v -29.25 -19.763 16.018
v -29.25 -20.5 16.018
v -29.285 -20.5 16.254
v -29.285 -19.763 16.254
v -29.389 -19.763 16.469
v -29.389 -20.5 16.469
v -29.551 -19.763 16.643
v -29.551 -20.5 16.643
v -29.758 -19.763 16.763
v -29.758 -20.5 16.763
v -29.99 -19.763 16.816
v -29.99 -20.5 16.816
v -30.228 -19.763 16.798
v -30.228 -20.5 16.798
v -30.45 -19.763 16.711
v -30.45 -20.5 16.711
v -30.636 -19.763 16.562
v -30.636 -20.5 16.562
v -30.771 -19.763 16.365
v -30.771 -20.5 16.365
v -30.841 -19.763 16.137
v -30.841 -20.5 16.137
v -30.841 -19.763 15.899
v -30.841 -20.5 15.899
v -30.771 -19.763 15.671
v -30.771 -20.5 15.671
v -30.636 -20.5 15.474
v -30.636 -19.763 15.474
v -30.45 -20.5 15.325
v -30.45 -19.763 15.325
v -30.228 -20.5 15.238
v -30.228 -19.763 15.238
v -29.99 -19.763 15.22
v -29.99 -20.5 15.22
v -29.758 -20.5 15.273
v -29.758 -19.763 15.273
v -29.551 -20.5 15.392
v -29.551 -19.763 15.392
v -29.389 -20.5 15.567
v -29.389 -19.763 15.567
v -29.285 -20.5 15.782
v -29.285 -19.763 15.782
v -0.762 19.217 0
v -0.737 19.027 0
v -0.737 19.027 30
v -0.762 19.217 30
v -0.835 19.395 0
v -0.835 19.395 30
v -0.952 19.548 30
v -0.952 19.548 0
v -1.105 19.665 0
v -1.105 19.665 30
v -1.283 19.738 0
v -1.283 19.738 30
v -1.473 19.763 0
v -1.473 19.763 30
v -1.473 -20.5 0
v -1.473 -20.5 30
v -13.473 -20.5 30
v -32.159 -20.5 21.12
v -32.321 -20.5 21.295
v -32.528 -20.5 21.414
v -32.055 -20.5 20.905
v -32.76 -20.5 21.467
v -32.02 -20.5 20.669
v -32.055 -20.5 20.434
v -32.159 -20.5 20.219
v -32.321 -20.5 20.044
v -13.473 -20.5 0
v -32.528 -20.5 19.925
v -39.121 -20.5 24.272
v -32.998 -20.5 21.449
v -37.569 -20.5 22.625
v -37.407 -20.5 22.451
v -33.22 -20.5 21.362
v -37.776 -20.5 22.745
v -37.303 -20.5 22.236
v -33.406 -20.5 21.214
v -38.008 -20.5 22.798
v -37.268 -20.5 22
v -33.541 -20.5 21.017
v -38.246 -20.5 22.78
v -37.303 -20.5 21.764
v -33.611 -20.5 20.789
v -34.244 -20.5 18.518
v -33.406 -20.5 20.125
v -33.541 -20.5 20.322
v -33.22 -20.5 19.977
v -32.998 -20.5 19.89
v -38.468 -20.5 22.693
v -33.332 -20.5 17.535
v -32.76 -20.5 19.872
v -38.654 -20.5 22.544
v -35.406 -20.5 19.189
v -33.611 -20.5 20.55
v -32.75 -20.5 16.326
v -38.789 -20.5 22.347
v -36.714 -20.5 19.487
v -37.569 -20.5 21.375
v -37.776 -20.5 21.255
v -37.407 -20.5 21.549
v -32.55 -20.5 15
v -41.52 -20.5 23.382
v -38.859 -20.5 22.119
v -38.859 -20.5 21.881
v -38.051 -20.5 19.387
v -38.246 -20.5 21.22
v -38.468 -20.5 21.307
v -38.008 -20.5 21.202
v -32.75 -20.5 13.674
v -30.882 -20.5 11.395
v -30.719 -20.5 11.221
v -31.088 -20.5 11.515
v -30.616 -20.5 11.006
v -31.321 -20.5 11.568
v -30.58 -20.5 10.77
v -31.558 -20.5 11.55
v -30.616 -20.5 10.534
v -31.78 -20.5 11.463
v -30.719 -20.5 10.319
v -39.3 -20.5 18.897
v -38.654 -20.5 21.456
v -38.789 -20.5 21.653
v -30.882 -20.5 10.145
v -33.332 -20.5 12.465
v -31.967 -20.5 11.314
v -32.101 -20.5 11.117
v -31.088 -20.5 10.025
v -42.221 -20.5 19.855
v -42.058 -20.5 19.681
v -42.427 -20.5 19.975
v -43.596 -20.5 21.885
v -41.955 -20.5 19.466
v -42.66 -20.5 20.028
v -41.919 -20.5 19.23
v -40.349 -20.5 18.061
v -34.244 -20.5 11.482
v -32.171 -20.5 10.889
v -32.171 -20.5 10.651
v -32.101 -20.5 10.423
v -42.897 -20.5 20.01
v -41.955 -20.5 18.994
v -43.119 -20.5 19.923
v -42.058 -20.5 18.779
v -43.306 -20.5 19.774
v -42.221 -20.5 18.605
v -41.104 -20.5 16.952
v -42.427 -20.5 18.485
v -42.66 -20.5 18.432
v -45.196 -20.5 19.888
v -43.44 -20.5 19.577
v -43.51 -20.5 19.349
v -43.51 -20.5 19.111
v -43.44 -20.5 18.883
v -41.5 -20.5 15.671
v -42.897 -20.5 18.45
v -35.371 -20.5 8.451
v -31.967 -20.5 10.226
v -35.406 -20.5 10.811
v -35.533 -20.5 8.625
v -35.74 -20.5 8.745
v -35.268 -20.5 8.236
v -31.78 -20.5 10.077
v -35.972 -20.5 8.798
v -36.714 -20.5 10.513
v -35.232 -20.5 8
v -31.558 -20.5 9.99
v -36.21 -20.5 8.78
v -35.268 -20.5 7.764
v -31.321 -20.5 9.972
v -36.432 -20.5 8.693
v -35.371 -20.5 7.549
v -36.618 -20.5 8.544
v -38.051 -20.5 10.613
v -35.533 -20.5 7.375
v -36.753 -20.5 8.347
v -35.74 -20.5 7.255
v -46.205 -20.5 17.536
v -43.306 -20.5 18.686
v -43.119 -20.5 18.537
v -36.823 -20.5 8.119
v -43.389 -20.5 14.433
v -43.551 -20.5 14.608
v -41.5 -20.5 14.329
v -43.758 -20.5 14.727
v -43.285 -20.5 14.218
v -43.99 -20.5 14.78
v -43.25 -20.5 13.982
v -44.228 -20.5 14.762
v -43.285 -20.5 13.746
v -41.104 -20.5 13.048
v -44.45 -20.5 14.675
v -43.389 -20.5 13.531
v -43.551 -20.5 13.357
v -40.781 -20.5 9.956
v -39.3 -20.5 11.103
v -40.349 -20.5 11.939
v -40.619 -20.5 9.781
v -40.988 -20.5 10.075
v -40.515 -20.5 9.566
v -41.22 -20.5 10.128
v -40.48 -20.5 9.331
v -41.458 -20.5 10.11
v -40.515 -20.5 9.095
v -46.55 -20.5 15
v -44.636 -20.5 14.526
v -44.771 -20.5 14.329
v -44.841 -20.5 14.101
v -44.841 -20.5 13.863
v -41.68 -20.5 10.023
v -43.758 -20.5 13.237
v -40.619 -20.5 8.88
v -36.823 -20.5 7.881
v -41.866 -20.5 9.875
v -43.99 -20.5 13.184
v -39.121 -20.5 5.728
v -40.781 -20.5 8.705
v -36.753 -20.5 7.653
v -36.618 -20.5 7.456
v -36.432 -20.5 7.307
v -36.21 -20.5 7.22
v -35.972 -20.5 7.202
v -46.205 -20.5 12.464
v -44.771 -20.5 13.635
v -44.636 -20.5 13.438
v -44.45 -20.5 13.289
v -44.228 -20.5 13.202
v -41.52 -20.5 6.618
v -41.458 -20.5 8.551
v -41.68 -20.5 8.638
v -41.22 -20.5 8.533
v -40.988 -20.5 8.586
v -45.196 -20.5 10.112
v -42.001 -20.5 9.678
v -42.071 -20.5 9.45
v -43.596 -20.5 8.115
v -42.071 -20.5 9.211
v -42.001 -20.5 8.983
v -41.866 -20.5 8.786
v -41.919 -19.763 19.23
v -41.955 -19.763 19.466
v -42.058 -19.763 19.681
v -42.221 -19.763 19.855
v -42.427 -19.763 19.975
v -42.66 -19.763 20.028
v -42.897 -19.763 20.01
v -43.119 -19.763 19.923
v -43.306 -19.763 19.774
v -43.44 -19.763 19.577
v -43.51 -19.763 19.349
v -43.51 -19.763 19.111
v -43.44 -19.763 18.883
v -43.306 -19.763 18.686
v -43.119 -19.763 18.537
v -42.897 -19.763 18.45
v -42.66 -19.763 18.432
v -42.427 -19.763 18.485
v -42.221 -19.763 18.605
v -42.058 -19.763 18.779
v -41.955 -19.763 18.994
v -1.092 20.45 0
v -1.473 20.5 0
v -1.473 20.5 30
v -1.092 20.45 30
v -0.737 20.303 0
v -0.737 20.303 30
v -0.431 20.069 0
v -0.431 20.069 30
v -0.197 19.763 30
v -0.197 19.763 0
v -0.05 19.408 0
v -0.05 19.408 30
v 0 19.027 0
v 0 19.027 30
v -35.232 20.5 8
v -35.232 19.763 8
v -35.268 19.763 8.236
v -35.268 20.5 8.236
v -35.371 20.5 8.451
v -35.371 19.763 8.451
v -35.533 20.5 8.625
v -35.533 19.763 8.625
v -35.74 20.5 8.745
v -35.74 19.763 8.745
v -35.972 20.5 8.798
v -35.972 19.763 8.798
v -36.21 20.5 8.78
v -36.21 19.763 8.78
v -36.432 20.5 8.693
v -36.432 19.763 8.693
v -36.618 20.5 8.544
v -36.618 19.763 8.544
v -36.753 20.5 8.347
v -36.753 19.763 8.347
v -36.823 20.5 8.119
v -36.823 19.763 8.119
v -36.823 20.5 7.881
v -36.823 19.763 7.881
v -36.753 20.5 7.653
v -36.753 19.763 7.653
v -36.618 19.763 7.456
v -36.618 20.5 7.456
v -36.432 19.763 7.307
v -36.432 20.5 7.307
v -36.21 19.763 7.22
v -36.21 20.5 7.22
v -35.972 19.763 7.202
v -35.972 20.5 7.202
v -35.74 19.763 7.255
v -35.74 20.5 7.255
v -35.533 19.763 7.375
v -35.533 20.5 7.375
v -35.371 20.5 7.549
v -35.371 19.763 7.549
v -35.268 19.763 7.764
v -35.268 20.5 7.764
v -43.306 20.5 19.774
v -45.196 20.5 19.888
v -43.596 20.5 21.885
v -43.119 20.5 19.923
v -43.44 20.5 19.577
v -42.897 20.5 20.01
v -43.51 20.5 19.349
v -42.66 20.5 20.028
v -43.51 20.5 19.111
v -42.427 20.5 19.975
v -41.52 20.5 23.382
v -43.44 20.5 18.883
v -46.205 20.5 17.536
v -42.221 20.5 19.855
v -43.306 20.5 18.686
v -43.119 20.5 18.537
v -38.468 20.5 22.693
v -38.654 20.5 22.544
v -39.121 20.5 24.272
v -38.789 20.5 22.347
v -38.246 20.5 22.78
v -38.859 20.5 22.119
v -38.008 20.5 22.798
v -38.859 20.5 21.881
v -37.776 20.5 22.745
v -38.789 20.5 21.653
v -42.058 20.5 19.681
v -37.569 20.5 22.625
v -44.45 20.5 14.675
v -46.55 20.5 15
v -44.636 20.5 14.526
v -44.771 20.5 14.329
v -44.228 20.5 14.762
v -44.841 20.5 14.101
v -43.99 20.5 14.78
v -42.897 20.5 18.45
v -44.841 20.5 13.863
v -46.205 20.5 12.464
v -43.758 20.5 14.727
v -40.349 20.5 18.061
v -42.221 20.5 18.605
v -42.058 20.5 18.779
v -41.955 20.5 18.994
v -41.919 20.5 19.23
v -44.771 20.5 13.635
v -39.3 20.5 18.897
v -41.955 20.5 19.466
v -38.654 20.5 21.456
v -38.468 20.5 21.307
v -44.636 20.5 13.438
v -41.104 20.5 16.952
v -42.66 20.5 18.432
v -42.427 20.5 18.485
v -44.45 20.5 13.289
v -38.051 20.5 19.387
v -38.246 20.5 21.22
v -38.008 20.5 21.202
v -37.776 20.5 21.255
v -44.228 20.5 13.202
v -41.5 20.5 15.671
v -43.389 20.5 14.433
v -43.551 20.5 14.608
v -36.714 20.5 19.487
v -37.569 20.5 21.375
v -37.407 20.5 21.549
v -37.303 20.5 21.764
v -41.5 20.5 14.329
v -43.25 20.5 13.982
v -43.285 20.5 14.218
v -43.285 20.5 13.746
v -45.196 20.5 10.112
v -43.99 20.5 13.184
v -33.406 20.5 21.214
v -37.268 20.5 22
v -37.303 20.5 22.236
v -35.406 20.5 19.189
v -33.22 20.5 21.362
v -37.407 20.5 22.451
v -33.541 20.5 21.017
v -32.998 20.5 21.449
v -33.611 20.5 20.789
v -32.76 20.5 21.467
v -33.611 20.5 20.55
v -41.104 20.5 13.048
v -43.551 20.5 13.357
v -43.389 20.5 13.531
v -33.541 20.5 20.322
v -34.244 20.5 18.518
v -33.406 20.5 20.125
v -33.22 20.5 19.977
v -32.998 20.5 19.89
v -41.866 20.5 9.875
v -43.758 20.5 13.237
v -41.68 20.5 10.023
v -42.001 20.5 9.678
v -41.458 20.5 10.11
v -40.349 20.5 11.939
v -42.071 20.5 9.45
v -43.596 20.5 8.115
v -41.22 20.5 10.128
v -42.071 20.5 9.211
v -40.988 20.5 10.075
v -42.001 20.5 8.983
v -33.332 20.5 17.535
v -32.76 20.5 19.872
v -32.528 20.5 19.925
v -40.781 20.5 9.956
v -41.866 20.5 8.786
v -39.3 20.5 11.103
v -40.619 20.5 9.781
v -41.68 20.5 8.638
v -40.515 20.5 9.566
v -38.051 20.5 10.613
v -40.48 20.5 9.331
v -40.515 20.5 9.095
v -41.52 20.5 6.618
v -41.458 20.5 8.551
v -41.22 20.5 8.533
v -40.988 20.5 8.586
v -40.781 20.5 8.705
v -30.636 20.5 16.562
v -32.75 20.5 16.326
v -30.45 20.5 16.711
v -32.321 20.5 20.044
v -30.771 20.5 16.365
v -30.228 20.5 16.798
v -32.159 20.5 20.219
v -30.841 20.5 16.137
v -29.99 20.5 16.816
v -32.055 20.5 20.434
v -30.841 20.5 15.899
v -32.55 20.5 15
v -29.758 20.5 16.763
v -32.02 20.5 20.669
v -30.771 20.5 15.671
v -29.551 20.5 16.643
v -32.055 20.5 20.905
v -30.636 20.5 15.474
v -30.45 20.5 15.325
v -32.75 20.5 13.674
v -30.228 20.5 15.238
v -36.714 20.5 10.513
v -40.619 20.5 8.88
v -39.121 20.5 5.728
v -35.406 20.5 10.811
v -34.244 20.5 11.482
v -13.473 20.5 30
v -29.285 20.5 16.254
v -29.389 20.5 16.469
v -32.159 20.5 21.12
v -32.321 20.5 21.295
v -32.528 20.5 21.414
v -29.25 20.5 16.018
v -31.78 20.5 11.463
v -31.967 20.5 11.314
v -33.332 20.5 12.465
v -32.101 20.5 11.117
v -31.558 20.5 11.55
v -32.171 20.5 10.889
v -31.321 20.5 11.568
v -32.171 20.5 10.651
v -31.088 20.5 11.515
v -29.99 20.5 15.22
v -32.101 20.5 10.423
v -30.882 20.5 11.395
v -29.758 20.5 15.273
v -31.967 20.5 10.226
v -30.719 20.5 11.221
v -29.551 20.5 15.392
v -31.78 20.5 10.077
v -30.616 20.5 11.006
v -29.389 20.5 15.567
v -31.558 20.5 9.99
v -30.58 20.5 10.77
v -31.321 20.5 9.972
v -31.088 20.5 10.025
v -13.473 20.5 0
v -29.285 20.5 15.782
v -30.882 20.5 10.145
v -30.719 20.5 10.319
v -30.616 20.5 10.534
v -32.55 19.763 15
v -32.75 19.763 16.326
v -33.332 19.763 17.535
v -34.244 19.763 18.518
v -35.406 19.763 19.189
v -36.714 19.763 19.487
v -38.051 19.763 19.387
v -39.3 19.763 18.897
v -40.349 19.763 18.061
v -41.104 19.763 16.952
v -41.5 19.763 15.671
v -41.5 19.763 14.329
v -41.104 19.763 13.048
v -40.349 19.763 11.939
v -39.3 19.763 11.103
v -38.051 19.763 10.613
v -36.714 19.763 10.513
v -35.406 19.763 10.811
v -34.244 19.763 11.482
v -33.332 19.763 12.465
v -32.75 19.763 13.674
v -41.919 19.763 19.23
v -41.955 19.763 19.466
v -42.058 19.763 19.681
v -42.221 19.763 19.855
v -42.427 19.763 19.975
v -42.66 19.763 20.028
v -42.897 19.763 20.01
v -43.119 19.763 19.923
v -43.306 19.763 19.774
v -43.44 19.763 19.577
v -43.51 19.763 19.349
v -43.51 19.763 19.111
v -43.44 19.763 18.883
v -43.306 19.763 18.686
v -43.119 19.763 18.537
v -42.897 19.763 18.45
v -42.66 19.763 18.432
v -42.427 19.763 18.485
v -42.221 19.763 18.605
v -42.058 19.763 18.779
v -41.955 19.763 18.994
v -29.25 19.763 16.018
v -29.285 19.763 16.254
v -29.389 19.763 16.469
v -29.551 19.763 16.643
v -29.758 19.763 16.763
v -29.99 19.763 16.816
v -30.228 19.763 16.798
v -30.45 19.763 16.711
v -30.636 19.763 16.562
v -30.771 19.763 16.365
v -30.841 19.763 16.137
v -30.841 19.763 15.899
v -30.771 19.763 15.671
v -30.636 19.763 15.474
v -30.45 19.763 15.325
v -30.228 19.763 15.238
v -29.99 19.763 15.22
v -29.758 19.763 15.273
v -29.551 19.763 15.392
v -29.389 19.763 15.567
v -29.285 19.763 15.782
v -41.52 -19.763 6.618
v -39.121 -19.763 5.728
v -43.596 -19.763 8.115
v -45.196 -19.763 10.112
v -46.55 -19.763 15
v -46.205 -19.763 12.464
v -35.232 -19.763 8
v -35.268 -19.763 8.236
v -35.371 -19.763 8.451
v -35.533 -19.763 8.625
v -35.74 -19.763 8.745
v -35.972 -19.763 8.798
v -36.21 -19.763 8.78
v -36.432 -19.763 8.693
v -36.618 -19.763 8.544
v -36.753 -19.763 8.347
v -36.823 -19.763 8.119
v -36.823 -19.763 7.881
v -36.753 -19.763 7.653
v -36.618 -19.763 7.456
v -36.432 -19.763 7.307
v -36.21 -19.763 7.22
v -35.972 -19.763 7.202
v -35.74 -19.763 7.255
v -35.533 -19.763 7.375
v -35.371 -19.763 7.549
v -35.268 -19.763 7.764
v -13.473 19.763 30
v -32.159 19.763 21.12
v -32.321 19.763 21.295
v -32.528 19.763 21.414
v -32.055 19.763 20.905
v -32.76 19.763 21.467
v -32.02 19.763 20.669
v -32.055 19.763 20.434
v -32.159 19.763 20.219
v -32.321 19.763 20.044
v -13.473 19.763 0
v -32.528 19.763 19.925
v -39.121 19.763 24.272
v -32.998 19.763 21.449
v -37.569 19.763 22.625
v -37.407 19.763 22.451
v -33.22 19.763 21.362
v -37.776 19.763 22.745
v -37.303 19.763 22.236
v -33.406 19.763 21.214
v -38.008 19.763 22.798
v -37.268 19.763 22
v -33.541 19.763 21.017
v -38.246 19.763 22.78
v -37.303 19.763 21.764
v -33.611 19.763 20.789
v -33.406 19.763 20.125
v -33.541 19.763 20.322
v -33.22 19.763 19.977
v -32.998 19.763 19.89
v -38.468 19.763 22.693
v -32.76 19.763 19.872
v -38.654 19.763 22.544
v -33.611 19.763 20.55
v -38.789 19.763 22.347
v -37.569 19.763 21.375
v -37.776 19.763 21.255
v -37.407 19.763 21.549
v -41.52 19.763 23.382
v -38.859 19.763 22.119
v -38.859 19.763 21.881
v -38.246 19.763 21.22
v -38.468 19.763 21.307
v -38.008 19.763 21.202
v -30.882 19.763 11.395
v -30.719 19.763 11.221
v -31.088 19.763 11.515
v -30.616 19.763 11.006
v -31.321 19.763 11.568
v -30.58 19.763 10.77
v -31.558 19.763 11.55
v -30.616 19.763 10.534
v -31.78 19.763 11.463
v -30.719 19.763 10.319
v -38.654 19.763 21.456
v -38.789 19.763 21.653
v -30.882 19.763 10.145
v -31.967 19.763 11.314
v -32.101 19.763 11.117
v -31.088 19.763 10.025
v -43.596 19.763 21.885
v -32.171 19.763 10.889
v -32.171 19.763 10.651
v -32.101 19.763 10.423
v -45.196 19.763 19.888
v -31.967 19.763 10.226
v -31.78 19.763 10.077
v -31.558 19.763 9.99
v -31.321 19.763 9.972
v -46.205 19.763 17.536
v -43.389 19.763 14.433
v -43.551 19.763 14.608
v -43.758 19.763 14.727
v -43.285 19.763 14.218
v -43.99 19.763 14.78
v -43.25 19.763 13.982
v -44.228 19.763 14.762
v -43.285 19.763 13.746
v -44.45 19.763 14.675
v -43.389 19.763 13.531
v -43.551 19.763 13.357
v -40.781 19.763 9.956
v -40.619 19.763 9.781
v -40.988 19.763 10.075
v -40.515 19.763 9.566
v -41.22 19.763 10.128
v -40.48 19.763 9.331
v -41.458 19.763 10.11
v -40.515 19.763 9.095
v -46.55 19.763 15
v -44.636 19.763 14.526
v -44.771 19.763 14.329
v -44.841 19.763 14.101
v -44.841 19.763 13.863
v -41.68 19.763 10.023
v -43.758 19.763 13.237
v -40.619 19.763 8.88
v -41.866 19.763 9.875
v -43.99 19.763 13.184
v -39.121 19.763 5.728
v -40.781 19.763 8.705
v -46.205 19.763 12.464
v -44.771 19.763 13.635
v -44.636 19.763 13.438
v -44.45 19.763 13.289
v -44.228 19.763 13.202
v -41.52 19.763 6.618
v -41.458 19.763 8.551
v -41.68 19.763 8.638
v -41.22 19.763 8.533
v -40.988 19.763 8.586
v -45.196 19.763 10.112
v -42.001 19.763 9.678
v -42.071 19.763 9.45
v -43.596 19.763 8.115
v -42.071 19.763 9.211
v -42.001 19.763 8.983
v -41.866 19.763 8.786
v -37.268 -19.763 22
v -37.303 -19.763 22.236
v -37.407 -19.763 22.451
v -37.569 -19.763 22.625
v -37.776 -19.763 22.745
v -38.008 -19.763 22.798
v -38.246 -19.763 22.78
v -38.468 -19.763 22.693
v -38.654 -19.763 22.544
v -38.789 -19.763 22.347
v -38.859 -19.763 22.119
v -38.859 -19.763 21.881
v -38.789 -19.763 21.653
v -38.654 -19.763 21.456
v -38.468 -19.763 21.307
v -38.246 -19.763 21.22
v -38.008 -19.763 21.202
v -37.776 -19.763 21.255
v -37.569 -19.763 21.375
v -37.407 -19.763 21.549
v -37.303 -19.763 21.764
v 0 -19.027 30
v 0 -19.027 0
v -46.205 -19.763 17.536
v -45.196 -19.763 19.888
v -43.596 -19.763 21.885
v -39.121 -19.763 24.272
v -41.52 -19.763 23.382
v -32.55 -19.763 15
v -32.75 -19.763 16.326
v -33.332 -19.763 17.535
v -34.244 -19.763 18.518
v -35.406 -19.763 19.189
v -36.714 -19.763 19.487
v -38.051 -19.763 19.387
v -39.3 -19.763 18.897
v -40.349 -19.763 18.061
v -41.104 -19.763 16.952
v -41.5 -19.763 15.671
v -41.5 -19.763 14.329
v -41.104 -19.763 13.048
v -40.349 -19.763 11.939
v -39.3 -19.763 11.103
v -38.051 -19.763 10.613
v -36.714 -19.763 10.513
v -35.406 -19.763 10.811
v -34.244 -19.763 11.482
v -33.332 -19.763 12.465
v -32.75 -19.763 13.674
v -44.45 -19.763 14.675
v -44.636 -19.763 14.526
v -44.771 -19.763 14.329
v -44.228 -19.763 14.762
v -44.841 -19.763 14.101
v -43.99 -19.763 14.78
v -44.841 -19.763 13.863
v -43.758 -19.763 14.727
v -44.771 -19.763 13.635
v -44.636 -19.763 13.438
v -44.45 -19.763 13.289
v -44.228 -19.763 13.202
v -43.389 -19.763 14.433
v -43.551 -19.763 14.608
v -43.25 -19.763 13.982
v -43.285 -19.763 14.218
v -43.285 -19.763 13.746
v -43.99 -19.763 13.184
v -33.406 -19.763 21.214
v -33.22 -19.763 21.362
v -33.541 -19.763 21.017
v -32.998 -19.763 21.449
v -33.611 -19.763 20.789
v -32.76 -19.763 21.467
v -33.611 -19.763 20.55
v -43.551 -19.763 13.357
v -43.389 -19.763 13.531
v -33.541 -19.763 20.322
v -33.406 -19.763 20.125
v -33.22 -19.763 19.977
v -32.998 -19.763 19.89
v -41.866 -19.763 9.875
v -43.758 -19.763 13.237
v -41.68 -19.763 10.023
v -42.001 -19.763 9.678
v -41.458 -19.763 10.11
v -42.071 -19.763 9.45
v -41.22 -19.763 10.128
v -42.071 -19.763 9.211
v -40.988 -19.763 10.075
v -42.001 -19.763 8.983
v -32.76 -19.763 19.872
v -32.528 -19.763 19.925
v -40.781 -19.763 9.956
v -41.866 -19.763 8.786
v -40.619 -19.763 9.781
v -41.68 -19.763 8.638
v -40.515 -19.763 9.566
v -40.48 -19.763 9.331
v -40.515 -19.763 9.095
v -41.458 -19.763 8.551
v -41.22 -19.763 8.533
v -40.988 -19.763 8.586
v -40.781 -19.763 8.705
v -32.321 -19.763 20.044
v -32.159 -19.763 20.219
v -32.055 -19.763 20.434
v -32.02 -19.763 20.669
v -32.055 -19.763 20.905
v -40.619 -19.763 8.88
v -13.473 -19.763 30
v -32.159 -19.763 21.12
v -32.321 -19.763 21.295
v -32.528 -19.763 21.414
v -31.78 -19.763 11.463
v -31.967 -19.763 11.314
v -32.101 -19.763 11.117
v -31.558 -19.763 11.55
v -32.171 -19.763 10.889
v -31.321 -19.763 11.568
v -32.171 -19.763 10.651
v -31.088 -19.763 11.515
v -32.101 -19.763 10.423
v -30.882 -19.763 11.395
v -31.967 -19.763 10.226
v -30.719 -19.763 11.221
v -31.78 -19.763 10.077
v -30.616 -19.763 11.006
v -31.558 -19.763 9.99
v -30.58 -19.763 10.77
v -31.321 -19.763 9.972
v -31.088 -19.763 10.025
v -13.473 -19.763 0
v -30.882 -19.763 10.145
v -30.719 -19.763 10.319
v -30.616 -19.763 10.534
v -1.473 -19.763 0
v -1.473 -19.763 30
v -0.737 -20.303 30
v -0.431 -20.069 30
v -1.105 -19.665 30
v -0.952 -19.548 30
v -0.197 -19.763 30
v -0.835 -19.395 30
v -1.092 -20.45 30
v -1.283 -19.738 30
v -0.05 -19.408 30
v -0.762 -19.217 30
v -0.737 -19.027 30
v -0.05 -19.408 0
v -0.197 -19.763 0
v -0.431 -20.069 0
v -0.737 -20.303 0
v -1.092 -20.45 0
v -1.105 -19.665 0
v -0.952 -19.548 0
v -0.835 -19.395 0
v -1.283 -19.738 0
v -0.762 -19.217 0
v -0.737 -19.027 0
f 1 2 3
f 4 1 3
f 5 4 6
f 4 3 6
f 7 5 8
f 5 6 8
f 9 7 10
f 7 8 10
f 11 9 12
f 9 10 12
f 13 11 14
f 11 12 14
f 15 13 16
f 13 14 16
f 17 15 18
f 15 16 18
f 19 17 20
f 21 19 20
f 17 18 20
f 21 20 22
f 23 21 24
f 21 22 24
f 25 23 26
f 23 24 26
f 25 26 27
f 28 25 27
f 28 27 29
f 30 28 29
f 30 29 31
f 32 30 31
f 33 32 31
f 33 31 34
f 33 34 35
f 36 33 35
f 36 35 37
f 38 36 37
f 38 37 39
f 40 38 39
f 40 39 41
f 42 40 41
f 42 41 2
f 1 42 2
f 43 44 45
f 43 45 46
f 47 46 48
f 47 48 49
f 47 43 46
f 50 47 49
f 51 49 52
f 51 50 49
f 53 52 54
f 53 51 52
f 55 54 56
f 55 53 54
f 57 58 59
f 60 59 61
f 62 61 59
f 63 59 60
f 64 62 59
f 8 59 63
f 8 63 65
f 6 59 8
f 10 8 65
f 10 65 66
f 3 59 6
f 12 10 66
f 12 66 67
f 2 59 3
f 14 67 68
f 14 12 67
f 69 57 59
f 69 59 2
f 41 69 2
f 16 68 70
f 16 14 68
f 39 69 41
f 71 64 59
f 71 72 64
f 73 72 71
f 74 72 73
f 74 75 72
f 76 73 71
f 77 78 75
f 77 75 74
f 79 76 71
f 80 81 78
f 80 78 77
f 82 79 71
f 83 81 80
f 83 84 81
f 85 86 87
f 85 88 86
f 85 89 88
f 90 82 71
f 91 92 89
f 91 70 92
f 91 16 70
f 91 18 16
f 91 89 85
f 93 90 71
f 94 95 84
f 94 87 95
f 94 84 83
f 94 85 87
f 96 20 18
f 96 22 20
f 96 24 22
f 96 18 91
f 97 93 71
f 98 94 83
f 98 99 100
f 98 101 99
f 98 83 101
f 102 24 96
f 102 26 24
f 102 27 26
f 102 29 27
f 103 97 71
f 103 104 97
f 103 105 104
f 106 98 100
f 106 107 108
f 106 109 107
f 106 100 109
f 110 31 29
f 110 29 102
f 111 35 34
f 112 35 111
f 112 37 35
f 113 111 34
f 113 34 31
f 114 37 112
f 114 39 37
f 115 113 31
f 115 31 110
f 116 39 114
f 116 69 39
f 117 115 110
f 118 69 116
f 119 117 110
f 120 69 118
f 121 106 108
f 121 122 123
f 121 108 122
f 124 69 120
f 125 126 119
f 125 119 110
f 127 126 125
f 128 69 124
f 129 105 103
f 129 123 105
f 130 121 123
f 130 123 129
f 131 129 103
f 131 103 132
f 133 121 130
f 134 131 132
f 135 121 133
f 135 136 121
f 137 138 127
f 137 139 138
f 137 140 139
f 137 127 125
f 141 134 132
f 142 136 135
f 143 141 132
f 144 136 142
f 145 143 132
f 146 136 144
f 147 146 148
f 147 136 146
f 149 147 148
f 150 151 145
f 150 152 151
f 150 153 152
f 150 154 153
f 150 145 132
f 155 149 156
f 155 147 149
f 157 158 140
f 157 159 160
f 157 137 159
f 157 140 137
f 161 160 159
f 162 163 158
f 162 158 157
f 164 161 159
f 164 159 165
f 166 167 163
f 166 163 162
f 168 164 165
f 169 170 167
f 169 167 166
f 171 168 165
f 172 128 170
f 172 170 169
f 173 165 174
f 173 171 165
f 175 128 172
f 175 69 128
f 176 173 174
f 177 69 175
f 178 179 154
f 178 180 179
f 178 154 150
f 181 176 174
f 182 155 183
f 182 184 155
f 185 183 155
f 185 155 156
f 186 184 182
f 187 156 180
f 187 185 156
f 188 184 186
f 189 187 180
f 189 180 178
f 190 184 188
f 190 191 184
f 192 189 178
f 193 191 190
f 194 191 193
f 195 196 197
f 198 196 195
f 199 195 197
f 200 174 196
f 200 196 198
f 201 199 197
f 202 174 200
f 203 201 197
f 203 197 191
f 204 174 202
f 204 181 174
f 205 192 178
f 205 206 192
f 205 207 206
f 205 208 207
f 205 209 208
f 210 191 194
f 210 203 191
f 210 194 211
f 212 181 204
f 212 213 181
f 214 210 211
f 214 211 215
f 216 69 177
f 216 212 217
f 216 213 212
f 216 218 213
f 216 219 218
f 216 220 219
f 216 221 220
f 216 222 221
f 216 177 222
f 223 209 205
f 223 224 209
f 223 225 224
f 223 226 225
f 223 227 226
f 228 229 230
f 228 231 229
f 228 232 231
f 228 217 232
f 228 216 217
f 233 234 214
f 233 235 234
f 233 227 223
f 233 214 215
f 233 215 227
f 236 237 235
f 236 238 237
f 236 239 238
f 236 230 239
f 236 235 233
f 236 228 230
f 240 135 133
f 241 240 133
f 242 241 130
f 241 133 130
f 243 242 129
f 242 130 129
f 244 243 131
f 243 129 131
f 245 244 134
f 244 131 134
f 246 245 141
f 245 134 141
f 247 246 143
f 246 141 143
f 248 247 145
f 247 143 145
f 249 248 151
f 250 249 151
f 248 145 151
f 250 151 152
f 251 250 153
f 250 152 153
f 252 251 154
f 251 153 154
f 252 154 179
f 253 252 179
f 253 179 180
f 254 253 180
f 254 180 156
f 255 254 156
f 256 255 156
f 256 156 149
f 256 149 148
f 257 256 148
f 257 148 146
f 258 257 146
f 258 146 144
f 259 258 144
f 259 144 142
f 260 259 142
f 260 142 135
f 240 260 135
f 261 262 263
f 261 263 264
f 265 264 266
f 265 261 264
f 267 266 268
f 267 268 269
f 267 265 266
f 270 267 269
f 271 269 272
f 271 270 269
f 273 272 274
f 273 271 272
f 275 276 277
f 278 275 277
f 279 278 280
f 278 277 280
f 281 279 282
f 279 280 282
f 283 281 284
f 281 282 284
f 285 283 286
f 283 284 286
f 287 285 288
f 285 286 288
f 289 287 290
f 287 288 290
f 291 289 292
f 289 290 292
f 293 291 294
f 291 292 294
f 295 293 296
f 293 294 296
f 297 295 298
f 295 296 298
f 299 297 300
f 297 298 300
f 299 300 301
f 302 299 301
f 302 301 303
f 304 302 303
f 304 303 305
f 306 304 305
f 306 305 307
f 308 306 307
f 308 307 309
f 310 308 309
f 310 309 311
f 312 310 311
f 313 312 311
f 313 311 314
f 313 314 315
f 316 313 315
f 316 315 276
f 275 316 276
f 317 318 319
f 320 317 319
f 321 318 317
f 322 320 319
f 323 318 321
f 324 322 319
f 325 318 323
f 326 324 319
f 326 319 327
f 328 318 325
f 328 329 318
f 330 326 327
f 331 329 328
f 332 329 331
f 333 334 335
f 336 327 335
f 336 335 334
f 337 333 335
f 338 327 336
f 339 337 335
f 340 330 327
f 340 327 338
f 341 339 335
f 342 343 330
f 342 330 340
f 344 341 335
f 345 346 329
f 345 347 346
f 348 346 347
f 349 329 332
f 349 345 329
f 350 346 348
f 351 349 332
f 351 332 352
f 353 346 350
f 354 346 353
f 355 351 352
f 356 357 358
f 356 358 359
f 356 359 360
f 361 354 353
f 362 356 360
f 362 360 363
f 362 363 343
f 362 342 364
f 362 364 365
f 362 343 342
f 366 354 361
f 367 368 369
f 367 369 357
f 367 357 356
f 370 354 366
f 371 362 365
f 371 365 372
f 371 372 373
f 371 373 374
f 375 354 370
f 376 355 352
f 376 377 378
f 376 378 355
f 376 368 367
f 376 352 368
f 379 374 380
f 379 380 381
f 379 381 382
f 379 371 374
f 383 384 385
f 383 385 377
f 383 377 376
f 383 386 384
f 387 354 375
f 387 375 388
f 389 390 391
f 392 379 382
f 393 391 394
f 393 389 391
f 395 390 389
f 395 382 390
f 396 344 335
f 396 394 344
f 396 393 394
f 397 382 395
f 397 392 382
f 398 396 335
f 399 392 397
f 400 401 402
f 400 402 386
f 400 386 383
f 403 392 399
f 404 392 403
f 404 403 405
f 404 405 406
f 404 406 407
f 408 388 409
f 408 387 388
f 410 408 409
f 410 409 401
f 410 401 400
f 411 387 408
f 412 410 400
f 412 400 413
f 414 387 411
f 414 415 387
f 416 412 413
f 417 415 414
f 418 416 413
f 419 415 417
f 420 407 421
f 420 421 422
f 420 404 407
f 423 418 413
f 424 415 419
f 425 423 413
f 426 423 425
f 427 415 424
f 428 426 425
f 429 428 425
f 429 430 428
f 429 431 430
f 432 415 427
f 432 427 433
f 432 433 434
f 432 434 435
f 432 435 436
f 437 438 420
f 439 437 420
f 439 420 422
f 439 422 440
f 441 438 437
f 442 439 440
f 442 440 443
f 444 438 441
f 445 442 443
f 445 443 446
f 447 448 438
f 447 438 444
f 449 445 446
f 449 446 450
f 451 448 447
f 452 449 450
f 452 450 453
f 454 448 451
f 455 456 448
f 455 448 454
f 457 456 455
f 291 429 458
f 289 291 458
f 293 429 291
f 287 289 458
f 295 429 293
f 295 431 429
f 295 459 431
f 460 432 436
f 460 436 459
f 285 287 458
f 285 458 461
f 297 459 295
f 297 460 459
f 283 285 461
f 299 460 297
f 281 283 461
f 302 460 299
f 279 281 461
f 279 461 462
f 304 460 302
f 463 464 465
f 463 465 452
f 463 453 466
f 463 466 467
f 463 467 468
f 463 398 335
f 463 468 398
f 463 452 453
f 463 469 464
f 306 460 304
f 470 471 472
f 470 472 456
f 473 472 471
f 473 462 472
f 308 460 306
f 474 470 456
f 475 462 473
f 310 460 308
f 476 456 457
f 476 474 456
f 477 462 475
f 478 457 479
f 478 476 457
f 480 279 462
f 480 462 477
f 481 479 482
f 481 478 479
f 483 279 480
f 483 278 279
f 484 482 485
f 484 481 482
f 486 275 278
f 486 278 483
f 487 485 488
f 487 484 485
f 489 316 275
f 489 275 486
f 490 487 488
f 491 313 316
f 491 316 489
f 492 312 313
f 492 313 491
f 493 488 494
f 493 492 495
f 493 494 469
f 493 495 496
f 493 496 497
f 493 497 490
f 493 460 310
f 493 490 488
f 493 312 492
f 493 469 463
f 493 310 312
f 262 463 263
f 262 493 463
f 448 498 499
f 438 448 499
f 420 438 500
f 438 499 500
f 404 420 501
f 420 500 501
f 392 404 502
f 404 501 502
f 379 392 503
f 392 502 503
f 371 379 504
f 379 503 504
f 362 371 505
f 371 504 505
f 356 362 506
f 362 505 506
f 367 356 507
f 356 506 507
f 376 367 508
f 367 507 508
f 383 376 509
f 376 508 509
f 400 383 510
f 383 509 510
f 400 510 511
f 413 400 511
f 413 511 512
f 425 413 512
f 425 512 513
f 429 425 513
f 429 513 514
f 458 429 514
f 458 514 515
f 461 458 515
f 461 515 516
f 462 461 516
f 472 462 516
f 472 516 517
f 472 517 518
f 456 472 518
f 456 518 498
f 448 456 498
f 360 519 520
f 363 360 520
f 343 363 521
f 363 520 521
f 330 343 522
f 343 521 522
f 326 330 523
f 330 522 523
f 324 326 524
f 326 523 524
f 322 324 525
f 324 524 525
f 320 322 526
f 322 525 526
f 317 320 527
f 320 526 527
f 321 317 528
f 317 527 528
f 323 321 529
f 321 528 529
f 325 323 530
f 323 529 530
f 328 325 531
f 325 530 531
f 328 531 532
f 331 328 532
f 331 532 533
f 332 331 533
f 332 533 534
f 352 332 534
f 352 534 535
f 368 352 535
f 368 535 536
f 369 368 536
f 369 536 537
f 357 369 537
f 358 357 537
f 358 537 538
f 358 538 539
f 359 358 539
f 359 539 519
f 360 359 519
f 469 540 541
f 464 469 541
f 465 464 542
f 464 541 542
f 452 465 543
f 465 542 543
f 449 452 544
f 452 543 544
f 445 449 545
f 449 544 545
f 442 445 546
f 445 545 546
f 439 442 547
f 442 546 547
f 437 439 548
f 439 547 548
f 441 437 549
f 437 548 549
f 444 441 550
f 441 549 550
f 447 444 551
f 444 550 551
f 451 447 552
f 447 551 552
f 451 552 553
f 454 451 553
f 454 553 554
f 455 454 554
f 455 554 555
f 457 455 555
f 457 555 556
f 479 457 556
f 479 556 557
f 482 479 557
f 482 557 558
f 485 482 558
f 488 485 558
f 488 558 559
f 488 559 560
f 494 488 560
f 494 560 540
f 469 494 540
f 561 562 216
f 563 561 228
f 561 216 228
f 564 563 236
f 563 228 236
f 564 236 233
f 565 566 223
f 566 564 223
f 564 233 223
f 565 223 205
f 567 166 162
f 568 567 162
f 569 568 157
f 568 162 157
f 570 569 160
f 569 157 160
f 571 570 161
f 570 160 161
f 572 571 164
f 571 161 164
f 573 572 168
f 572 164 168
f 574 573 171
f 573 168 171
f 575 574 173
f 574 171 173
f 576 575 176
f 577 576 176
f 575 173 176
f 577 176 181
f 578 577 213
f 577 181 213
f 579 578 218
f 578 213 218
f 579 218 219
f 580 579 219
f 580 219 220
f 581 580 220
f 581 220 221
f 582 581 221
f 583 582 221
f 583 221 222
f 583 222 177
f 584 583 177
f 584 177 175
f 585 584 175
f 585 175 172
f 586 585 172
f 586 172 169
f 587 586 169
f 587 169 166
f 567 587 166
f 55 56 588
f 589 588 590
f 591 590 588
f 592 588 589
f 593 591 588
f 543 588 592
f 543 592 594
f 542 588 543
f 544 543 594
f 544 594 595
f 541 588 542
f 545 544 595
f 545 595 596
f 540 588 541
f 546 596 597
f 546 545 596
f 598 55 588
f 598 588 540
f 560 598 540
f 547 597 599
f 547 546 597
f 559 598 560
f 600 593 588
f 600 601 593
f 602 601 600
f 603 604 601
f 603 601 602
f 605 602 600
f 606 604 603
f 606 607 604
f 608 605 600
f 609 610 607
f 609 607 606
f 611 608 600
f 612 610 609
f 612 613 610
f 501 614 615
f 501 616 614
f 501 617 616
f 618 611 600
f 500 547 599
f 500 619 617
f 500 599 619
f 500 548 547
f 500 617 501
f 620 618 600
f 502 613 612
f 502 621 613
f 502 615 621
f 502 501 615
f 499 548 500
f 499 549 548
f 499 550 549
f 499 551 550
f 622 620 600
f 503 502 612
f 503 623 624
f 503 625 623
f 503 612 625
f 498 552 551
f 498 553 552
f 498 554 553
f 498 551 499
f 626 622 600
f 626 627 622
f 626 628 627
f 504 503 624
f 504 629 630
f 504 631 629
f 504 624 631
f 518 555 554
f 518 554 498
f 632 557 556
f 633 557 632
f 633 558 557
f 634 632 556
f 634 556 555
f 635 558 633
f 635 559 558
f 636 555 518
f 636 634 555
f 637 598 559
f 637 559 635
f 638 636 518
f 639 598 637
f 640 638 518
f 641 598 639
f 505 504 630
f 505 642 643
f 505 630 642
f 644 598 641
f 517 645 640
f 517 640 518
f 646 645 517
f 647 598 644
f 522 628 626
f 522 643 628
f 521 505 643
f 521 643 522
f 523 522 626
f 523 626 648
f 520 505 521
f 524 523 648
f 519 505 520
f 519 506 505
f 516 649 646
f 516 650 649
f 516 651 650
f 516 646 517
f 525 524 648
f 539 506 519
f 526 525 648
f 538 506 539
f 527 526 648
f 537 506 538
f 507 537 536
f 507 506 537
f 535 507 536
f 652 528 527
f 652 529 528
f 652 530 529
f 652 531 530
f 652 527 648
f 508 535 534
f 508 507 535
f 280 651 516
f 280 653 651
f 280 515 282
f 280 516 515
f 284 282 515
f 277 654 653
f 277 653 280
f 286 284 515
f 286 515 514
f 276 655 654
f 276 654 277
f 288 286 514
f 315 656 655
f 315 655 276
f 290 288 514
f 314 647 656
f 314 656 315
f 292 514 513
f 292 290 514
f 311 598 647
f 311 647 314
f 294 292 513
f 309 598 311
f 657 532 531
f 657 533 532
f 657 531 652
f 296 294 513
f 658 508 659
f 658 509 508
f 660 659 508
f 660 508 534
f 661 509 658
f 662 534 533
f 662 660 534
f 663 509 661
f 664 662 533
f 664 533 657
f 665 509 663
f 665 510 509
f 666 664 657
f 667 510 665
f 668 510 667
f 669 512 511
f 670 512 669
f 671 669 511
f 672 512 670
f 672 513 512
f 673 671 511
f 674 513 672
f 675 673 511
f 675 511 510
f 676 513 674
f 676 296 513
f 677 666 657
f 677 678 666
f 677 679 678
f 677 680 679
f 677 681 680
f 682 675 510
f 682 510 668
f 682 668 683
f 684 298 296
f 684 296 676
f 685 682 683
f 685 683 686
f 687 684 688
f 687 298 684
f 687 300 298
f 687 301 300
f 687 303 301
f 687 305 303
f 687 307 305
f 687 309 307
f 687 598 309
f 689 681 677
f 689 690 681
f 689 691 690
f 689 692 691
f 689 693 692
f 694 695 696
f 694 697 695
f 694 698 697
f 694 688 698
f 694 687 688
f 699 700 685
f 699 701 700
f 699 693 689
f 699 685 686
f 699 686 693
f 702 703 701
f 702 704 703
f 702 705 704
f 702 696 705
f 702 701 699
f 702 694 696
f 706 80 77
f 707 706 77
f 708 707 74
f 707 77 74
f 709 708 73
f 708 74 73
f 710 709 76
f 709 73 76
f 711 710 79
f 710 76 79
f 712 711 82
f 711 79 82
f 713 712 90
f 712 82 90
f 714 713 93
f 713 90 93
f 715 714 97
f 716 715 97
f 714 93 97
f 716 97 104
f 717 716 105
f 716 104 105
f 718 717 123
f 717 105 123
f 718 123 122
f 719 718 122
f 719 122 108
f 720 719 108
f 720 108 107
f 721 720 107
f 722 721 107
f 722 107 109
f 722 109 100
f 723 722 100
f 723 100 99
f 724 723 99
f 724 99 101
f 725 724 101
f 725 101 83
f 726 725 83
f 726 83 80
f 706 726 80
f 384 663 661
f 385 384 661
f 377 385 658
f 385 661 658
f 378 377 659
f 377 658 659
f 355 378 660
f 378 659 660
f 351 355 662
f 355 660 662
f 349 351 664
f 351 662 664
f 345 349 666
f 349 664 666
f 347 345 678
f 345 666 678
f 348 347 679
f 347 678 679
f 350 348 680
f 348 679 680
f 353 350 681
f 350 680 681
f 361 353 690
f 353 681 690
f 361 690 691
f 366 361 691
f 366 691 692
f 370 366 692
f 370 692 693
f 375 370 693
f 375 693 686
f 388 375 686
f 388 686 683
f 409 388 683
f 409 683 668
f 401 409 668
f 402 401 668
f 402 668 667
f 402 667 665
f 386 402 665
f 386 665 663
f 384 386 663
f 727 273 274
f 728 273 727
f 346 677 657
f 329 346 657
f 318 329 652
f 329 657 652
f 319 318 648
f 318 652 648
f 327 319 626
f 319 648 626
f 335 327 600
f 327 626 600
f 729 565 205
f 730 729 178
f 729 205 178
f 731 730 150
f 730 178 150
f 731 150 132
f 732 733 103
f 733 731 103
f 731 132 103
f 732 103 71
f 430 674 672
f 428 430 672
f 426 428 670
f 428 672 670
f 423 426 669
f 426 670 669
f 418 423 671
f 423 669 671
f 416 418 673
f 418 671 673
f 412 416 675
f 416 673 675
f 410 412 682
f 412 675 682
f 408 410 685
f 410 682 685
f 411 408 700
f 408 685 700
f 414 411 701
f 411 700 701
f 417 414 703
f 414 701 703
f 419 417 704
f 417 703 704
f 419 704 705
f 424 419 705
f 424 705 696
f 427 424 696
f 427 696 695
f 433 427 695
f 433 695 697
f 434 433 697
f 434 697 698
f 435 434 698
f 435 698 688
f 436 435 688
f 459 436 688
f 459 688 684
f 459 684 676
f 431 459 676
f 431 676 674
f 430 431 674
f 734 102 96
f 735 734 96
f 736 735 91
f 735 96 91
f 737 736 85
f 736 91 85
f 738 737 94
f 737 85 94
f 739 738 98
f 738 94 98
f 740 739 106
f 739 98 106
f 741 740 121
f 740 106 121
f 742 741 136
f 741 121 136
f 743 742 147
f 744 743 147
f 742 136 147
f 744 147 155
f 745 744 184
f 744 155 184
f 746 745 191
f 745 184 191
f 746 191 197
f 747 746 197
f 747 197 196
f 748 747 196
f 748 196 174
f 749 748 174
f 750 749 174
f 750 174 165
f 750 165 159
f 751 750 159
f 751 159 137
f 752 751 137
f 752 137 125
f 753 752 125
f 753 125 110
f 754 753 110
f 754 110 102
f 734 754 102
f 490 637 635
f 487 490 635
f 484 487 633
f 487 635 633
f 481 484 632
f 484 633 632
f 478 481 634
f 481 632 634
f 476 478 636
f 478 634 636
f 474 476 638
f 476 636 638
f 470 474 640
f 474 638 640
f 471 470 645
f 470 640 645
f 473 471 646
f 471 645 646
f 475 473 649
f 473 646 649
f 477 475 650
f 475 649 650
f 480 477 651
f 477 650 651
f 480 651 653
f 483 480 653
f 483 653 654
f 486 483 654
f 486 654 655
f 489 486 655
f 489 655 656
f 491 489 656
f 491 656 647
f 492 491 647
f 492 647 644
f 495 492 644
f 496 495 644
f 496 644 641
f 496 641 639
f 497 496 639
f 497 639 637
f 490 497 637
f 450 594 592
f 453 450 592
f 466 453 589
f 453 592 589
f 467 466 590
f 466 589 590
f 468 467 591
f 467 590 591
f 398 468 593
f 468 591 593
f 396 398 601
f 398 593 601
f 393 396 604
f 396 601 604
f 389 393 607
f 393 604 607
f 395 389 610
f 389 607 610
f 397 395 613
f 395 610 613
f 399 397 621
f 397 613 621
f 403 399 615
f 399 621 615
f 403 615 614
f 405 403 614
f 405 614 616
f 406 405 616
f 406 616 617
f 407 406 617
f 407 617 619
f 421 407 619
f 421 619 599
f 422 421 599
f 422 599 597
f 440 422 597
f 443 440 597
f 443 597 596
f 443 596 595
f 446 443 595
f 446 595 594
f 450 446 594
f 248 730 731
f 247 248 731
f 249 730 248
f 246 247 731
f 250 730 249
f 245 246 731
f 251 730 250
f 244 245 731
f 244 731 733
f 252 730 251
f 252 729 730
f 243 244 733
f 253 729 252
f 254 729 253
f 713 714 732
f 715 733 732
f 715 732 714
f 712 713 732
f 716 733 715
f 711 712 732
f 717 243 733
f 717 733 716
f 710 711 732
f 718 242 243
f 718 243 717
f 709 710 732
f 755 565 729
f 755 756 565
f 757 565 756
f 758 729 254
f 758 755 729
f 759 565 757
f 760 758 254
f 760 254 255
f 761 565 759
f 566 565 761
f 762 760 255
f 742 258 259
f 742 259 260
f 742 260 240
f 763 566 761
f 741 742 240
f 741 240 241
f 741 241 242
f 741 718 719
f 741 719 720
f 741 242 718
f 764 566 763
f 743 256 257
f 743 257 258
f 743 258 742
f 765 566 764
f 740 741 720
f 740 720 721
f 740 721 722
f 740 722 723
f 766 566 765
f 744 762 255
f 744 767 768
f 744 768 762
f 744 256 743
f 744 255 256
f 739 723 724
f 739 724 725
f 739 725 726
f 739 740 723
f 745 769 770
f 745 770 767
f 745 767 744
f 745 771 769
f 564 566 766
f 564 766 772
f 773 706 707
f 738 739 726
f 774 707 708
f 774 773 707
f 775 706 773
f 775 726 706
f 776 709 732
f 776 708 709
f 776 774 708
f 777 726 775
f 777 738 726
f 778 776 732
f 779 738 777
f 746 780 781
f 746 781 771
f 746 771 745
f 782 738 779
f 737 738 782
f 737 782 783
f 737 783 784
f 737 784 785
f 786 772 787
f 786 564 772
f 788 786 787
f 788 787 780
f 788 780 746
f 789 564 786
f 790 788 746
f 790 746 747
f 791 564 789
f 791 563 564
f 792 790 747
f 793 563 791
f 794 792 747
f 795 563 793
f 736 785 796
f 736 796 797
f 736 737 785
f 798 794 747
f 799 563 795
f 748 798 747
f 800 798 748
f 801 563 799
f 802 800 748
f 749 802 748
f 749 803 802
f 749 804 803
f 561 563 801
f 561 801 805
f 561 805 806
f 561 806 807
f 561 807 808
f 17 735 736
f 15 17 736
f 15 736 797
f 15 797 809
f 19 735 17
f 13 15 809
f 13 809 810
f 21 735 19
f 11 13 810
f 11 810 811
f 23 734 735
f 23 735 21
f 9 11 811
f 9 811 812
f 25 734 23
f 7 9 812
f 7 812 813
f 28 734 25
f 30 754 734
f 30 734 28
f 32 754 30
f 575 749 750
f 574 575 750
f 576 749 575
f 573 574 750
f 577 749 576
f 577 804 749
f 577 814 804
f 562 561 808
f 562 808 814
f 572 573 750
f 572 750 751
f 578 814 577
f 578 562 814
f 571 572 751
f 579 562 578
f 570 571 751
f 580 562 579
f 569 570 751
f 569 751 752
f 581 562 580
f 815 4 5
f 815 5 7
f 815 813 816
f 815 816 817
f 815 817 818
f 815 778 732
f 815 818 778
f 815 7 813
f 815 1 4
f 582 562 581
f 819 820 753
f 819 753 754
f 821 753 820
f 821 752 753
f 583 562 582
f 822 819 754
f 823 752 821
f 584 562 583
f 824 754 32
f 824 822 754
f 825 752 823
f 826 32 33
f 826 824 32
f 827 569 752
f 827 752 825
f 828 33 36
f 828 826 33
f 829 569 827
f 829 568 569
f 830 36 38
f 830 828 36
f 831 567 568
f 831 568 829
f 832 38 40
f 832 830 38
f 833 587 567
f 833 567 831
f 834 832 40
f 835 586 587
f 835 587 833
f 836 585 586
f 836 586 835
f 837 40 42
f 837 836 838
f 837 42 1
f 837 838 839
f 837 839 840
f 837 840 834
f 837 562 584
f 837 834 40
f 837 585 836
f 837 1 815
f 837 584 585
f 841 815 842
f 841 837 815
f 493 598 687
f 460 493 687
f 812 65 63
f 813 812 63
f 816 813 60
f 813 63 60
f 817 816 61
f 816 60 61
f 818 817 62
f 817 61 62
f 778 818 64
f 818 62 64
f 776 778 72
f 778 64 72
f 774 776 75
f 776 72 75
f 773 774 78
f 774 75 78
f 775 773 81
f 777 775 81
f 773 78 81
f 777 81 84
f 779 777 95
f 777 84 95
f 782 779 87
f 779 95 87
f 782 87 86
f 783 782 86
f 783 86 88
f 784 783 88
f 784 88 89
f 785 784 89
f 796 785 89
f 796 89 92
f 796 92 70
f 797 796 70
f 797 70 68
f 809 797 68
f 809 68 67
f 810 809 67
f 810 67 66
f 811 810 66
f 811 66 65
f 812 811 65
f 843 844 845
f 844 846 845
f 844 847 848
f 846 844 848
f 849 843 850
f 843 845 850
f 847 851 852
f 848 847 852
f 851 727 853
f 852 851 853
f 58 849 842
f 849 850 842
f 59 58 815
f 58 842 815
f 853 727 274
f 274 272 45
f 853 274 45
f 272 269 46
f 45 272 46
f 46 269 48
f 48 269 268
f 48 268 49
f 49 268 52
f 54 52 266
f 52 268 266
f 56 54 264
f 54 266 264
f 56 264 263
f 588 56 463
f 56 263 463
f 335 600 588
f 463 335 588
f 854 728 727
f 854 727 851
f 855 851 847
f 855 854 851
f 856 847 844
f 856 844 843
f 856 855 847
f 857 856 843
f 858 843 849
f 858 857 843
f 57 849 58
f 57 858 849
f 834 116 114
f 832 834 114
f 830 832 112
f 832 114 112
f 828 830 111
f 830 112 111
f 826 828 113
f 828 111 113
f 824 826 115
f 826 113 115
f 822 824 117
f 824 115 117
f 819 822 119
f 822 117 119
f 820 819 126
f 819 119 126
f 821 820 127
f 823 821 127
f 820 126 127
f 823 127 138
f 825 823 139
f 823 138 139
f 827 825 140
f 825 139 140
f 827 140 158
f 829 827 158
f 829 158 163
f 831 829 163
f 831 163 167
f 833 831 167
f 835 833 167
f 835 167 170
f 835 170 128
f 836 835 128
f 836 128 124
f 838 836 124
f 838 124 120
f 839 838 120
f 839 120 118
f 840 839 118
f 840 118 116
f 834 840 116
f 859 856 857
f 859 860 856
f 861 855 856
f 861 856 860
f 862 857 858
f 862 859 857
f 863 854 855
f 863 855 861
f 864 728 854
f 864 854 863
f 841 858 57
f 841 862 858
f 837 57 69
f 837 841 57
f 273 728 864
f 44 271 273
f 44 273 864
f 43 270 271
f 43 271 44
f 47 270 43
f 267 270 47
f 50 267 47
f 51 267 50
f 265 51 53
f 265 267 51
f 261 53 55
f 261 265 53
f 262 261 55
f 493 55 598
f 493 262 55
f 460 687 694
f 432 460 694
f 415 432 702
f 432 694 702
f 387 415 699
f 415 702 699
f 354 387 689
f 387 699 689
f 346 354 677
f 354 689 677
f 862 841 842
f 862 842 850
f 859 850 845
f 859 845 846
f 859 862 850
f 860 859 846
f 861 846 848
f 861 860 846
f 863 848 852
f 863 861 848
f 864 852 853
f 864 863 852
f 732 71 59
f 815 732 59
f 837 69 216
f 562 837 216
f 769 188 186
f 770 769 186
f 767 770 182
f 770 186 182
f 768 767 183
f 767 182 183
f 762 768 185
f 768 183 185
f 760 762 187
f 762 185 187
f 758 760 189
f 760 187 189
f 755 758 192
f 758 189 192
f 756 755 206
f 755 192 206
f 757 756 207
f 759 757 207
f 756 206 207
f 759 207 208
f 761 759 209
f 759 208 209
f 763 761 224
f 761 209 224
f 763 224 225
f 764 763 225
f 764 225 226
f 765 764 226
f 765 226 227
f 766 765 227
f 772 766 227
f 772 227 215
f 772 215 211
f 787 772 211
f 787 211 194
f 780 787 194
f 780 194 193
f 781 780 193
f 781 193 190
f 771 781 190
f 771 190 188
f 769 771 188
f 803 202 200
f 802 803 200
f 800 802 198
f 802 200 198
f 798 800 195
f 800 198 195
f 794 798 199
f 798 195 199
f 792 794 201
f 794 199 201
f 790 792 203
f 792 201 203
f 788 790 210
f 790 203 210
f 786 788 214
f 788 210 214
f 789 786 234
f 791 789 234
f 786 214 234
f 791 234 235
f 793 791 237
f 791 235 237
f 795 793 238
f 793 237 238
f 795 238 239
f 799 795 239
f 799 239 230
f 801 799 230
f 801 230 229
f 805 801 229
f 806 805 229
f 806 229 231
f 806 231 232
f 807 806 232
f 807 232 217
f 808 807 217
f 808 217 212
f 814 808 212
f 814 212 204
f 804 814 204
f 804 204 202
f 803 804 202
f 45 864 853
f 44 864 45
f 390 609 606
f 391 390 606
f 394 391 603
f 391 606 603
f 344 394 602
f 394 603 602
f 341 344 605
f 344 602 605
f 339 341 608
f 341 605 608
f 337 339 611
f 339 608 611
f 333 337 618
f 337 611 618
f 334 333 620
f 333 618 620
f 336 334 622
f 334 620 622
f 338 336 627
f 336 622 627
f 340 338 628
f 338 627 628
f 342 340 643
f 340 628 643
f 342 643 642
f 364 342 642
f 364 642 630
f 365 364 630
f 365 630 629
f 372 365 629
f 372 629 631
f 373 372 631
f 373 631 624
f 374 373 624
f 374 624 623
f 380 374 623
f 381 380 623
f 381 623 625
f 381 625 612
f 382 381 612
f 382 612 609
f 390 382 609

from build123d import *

# Parameters (mm, degrees)
T_LE_DE_BASE_PLI_E1_DEPTH = 30
ESQUISSE13_R              = 4.5
ESQUISSE13_R_2            = 0.8
ENL_V_MAT_EXTRU_2_DEPTH   = 72.281133549


# Sheet-metal steps are written as plain solids
with BuildPart() as part:
    # Esquisse1 → Tôle de base pliée1 (new body)
    with BuildSketch(Plane.XY):
        with BuildLine():
            Line((-50, 20.5), (-1.4732, 20.5))
            ThreePointArc((-1.4732, 20.5), (-0.43149029, 20.06850971), (0, 19.0268))
            Line((0, 19.0268), (0, -19.0268))
            ThreePointArc((0, -19.0268), (-0.43149029, -20.06850971), (-1.4732, -20.5))
            Line((-1.4732, -20.5), (-50, -20.5))
            Line((-50, -20.5), (-50, -19.7634))
            Line((-50, -19.7634), (-1.4732, -19.7634))
            ThreePointArc((-1.4732, -19.7634), (-0.952345145, -19.547654855), (-0.7366, -19.0268))
            Line((-0.7366, -19.0268), (-0.7366, 19.0268))
            ThreePointArc((-0.7366, 19.0268), (-0.952345145, 19.547654855), (-1.4732, 19.7634))
            Line((-1.4732, 19.7634), (-50, 19.7634))
            Line((-50, 19.7634), (-50, 20.5))
        make_face()
    extrude(amount=T_LE_DE_BASE_PLI_E1_DEPTH)

    # Esquisse13 → Enlèv. mat.-Extru.2 (cut, through all)
    with BuildSketch(Plane.XZ.offset(20.5)):
        with BuildLine():
            ThreePointArc((-46.549919552, 15), (-44.463516741, 20.940418901), (-39.120745506, 24.271552182))
            Line((-39.120745506, 24.271552182), (-13.4732, 30))
            Line((-13.4732, 30), (-50, 30))
            Line((-50, 30), (-50, 15))
            Line((-50, 15), (-46.549919552, 15))
        make_face()
        with BuildLine():
            Line((-13.4732, 0), (-39.120745506, 5.728447818))
            ThreePointArc((-39.120745506, 5.728447818), (-44.463516741, 9.059581099), (-46.549919552, 15))
            Line((-46.549919552, 15), (-50, 15))
            Line((-50, 15), (-50, 0))
            Line((-50, 0), (-13.4732, 0))
        make_face()
        with Locations((-37.049919552, 15)):
            Circle(ESQUISSE13_R)
        with Locations((-30.049919552, 16.017866465)):
            Circle(ESQUISSE13_R_2)
        with Locations((-32.819912364, 20.669487748)):
            Circle(ESQUISSE13_R_2)
        with Locations((-38.067786017, 22)):
            Circle(ESQUISSE13_R_2)
        with Locations((-42.7194073, 19.230007189)):
            Circle(ESQUISSE13_R_2)
        with Locations((-44.049919552, 13.982133535)):
            Circle(ESQUISSE13_R_2)
        with Locations((-41.279926741, 9.330512252)):
            Circle(ESQUISSE13_R_2)
        with Locations((-36.032053088, 8)):
            Circle(ESQUISSE13_R_2)
        with Locations((-31.380431805, 10.769992811)):
            Circle(ESQUISSE13_R_2)
    extrude(amount=-ENL_V_MAT_EXTRU_2_DEPTH, mode=Mode.SUBTRACT)


solid = part.part
